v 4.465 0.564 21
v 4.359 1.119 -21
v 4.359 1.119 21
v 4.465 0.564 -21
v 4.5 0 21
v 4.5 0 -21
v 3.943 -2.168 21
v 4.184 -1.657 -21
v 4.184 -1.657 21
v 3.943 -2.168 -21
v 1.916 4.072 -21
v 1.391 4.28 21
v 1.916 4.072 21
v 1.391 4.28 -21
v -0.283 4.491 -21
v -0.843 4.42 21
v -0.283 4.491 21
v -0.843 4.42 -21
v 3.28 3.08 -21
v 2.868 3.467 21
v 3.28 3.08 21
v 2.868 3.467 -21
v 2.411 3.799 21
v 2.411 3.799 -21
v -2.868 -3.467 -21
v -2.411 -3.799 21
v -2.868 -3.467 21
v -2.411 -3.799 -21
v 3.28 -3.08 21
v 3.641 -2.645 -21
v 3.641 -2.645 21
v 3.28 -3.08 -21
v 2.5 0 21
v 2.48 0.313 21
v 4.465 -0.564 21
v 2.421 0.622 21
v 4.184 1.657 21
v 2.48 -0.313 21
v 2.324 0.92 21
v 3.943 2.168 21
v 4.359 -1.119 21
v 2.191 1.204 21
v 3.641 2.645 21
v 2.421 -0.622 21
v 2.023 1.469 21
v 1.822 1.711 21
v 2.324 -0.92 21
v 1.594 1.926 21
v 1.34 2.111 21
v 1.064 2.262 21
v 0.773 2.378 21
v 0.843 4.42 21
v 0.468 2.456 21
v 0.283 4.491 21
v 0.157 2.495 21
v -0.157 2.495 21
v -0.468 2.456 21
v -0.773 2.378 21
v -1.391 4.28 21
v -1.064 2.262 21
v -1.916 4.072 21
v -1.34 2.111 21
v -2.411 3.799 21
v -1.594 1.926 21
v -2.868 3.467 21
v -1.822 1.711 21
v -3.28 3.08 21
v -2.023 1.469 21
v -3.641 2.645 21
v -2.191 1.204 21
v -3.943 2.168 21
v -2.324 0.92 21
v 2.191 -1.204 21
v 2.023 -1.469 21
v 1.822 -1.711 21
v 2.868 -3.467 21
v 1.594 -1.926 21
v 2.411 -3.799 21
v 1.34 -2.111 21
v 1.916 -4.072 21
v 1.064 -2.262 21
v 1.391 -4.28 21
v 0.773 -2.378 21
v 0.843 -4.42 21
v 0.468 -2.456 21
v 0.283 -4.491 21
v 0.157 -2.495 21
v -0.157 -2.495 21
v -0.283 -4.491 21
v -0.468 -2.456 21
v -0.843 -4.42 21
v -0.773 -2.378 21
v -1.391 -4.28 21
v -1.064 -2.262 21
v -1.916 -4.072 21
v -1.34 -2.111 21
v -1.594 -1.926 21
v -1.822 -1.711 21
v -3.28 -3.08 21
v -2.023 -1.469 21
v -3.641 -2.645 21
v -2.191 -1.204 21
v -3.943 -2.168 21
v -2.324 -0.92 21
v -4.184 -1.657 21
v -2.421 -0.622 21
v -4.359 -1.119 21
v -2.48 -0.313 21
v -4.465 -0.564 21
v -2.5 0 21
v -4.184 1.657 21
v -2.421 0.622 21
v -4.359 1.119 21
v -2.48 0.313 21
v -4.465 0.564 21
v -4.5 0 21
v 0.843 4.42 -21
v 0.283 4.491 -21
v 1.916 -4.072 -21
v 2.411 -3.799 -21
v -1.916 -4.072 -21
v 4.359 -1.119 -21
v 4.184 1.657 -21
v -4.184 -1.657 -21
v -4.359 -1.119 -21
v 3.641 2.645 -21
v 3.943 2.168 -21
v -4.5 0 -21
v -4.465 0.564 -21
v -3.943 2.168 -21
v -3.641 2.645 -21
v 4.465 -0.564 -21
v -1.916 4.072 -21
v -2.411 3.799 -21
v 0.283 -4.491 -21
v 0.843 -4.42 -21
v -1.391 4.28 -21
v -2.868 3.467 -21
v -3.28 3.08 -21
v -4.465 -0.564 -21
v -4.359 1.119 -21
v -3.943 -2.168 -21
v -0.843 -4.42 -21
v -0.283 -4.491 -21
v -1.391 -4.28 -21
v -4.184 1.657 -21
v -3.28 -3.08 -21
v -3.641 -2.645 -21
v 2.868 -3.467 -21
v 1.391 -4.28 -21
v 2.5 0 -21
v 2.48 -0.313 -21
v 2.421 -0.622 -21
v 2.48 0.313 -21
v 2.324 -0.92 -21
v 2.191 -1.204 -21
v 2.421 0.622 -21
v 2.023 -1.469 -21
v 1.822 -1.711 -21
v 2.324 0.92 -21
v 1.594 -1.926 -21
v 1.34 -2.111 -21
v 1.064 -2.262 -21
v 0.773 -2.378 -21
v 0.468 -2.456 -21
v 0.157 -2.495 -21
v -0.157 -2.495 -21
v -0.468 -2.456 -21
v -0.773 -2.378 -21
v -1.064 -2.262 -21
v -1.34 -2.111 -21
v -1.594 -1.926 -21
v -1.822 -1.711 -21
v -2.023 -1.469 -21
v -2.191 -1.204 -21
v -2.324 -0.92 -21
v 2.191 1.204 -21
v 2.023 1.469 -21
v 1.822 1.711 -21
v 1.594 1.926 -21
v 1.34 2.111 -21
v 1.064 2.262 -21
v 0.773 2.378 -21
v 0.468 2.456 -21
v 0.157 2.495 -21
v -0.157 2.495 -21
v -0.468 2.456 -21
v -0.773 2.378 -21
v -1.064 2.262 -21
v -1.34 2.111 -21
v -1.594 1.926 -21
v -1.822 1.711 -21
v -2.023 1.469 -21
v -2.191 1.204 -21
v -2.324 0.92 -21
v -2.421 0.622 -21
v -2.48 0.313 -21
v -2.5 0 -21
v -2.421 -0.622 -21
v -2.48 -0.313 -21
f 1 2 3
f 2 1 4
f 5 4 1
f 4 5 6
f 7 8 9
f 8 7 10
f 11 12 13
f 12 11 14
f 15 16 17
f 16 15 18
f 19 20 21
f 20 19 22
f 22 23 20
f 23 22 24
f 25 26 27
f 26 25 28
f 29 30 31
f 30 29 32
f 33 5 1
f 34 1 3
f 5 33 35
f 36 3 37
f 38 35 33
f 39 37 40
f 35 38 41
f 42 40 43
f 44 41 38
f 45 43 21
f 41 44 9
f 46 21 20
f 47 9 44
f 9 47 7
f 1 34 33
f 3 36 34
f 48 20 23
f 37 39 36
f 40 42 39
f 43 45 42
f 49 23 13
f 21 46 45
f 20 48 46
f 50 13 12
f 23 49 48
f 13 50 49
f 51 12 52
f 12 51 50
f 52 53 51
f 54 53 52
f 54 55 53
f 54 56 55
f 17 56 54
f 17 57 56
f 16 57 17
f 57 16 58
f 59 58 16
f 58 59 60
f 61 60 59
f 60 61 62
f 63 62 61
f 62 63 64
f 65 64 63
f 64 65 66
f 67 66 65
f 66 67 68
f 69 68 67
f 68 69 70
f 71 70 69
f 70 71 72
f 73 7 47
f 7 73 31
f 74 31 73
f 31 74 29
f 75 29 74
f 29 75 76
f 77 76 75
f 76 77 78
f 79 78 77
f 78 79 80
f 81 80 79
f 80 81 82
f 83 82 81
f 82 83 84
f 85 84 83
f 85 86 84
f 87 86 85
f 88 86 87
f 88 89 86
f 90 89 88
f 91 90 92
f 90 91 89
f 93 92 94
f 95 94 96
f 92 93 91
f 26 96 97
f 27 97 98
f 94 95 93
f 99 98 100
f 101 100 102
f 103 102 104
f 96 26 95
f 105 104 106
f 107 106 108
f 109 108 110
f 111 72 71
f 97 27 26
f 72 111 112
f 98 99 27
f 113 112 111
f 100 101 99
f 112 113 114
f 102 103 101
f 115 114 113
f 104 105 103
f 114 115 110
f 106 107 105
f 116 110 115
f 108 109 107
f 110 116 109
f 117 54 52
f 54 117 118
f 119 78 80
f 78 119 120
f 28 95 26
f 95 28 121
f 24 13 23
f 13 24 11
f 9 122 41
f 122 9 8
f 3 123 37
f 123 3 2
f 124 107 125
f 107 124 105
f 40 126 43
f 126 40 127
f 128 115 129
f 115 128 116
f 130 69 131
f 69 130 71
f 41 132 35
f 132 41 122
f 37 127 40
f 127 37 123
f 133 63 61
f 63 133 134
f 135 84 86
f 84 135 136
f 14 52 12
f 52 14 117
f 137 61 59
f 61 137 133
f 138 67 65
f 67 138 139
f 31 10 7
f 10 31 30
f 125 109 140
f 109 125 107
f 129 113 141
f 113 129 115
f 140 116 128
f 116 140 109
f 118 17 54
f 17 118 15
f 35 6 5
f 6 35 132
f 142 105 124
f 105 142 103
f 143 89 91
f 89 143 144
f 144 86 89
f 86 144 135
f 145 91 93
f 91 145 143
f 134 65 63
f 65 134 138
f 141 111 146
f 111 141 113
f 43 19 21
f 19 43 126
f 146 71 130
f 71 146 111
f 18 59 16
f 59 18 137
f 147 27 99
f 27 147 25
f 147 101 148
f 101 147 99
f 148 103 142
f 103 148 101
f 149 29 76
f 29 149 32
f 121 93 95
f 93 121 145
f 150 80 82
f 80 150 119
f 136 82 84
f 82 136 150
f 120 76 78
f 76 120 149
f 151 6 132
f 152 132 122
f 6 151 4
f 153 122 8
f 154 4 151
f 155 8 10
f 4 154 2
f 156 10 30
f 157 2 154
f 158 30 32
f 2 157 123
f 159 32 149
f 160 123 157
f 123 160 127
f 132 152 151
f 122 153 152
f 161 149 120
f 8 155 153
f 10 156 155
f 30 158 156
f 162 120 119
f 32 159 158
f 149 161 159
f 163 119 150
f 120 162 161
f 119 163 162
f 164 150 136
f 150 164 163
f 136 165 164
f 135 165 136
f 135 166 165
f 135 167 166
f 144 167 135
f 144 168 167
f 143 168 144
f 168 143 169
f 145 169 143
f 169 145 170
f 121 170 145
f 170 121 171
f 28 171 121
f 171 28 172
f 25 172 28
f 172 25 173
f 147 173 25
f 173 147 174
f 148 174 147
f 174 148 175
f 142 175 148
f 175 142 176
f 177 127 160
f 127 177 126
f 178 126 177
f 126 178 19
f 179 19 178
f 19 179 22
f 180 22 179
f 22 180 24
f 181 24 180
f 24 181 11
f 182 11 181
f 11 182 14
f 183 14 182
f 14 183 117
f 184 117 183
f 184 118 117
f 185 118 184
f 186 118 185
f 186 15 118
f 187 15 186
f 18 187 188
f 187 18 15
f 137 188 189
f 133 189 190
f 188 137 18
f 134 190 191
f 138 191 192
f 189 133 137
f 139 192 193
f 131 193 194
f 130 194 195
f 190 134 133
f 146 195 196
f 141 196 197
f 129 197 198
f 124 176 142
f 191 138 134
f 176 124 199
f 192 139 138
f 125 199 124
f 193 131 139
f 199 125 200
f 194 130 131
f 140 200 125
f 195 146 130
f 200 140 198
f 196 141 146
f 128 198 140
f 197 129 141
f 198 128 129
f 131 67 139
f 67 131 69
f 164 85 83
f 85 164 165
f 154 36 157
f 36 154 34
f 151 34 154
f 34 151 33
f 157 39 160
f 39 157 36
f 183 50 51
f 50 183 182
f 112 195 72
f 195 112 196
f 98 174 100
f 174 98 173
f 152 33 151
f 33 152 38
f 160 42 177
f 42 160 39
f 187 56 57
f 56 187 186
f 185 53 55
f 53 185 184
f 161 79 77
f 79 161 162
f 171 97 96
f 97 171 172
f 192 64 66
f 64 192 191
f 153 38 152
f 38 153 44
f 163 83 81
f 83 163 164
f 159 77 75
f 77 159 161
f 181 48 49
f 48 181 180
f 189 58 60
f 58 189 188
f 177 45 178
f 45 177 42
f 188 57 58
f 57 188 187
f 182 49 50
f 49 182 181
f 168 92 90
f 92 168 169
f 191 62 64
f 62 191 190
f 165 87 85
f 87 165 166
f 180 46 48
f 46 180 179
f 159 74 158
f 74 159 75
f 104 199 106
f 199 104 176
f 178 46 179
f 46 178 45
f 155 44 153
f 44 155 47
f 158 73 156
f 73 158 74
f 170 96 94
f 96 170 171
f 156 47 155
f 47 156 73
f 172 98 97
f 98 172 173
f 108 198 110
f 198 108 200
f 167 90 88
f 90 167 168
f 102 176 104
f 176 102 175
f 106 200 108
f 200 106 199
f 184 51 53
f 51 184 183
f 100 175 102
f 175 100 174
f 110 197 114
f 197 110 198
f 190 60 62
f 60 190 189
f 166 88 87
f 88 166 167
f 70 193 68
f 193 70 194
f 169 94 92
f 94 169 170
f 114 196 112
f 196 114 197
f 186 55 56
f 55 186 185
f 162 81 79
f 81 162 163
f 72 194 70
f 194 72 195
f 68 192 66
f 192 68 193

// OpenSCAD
$fn = 50;


difference() {
	union() {
		translate(v = [0, 0, -21.0000000000]) {
			cylinder(h = 42, r = 4.5000000000);
		}
	}
	union() {
		translate(v = [0, 0, -100.0000000000]) {
			cylinder(h = 200, r = 2.5000000000);
		}
	}
}
